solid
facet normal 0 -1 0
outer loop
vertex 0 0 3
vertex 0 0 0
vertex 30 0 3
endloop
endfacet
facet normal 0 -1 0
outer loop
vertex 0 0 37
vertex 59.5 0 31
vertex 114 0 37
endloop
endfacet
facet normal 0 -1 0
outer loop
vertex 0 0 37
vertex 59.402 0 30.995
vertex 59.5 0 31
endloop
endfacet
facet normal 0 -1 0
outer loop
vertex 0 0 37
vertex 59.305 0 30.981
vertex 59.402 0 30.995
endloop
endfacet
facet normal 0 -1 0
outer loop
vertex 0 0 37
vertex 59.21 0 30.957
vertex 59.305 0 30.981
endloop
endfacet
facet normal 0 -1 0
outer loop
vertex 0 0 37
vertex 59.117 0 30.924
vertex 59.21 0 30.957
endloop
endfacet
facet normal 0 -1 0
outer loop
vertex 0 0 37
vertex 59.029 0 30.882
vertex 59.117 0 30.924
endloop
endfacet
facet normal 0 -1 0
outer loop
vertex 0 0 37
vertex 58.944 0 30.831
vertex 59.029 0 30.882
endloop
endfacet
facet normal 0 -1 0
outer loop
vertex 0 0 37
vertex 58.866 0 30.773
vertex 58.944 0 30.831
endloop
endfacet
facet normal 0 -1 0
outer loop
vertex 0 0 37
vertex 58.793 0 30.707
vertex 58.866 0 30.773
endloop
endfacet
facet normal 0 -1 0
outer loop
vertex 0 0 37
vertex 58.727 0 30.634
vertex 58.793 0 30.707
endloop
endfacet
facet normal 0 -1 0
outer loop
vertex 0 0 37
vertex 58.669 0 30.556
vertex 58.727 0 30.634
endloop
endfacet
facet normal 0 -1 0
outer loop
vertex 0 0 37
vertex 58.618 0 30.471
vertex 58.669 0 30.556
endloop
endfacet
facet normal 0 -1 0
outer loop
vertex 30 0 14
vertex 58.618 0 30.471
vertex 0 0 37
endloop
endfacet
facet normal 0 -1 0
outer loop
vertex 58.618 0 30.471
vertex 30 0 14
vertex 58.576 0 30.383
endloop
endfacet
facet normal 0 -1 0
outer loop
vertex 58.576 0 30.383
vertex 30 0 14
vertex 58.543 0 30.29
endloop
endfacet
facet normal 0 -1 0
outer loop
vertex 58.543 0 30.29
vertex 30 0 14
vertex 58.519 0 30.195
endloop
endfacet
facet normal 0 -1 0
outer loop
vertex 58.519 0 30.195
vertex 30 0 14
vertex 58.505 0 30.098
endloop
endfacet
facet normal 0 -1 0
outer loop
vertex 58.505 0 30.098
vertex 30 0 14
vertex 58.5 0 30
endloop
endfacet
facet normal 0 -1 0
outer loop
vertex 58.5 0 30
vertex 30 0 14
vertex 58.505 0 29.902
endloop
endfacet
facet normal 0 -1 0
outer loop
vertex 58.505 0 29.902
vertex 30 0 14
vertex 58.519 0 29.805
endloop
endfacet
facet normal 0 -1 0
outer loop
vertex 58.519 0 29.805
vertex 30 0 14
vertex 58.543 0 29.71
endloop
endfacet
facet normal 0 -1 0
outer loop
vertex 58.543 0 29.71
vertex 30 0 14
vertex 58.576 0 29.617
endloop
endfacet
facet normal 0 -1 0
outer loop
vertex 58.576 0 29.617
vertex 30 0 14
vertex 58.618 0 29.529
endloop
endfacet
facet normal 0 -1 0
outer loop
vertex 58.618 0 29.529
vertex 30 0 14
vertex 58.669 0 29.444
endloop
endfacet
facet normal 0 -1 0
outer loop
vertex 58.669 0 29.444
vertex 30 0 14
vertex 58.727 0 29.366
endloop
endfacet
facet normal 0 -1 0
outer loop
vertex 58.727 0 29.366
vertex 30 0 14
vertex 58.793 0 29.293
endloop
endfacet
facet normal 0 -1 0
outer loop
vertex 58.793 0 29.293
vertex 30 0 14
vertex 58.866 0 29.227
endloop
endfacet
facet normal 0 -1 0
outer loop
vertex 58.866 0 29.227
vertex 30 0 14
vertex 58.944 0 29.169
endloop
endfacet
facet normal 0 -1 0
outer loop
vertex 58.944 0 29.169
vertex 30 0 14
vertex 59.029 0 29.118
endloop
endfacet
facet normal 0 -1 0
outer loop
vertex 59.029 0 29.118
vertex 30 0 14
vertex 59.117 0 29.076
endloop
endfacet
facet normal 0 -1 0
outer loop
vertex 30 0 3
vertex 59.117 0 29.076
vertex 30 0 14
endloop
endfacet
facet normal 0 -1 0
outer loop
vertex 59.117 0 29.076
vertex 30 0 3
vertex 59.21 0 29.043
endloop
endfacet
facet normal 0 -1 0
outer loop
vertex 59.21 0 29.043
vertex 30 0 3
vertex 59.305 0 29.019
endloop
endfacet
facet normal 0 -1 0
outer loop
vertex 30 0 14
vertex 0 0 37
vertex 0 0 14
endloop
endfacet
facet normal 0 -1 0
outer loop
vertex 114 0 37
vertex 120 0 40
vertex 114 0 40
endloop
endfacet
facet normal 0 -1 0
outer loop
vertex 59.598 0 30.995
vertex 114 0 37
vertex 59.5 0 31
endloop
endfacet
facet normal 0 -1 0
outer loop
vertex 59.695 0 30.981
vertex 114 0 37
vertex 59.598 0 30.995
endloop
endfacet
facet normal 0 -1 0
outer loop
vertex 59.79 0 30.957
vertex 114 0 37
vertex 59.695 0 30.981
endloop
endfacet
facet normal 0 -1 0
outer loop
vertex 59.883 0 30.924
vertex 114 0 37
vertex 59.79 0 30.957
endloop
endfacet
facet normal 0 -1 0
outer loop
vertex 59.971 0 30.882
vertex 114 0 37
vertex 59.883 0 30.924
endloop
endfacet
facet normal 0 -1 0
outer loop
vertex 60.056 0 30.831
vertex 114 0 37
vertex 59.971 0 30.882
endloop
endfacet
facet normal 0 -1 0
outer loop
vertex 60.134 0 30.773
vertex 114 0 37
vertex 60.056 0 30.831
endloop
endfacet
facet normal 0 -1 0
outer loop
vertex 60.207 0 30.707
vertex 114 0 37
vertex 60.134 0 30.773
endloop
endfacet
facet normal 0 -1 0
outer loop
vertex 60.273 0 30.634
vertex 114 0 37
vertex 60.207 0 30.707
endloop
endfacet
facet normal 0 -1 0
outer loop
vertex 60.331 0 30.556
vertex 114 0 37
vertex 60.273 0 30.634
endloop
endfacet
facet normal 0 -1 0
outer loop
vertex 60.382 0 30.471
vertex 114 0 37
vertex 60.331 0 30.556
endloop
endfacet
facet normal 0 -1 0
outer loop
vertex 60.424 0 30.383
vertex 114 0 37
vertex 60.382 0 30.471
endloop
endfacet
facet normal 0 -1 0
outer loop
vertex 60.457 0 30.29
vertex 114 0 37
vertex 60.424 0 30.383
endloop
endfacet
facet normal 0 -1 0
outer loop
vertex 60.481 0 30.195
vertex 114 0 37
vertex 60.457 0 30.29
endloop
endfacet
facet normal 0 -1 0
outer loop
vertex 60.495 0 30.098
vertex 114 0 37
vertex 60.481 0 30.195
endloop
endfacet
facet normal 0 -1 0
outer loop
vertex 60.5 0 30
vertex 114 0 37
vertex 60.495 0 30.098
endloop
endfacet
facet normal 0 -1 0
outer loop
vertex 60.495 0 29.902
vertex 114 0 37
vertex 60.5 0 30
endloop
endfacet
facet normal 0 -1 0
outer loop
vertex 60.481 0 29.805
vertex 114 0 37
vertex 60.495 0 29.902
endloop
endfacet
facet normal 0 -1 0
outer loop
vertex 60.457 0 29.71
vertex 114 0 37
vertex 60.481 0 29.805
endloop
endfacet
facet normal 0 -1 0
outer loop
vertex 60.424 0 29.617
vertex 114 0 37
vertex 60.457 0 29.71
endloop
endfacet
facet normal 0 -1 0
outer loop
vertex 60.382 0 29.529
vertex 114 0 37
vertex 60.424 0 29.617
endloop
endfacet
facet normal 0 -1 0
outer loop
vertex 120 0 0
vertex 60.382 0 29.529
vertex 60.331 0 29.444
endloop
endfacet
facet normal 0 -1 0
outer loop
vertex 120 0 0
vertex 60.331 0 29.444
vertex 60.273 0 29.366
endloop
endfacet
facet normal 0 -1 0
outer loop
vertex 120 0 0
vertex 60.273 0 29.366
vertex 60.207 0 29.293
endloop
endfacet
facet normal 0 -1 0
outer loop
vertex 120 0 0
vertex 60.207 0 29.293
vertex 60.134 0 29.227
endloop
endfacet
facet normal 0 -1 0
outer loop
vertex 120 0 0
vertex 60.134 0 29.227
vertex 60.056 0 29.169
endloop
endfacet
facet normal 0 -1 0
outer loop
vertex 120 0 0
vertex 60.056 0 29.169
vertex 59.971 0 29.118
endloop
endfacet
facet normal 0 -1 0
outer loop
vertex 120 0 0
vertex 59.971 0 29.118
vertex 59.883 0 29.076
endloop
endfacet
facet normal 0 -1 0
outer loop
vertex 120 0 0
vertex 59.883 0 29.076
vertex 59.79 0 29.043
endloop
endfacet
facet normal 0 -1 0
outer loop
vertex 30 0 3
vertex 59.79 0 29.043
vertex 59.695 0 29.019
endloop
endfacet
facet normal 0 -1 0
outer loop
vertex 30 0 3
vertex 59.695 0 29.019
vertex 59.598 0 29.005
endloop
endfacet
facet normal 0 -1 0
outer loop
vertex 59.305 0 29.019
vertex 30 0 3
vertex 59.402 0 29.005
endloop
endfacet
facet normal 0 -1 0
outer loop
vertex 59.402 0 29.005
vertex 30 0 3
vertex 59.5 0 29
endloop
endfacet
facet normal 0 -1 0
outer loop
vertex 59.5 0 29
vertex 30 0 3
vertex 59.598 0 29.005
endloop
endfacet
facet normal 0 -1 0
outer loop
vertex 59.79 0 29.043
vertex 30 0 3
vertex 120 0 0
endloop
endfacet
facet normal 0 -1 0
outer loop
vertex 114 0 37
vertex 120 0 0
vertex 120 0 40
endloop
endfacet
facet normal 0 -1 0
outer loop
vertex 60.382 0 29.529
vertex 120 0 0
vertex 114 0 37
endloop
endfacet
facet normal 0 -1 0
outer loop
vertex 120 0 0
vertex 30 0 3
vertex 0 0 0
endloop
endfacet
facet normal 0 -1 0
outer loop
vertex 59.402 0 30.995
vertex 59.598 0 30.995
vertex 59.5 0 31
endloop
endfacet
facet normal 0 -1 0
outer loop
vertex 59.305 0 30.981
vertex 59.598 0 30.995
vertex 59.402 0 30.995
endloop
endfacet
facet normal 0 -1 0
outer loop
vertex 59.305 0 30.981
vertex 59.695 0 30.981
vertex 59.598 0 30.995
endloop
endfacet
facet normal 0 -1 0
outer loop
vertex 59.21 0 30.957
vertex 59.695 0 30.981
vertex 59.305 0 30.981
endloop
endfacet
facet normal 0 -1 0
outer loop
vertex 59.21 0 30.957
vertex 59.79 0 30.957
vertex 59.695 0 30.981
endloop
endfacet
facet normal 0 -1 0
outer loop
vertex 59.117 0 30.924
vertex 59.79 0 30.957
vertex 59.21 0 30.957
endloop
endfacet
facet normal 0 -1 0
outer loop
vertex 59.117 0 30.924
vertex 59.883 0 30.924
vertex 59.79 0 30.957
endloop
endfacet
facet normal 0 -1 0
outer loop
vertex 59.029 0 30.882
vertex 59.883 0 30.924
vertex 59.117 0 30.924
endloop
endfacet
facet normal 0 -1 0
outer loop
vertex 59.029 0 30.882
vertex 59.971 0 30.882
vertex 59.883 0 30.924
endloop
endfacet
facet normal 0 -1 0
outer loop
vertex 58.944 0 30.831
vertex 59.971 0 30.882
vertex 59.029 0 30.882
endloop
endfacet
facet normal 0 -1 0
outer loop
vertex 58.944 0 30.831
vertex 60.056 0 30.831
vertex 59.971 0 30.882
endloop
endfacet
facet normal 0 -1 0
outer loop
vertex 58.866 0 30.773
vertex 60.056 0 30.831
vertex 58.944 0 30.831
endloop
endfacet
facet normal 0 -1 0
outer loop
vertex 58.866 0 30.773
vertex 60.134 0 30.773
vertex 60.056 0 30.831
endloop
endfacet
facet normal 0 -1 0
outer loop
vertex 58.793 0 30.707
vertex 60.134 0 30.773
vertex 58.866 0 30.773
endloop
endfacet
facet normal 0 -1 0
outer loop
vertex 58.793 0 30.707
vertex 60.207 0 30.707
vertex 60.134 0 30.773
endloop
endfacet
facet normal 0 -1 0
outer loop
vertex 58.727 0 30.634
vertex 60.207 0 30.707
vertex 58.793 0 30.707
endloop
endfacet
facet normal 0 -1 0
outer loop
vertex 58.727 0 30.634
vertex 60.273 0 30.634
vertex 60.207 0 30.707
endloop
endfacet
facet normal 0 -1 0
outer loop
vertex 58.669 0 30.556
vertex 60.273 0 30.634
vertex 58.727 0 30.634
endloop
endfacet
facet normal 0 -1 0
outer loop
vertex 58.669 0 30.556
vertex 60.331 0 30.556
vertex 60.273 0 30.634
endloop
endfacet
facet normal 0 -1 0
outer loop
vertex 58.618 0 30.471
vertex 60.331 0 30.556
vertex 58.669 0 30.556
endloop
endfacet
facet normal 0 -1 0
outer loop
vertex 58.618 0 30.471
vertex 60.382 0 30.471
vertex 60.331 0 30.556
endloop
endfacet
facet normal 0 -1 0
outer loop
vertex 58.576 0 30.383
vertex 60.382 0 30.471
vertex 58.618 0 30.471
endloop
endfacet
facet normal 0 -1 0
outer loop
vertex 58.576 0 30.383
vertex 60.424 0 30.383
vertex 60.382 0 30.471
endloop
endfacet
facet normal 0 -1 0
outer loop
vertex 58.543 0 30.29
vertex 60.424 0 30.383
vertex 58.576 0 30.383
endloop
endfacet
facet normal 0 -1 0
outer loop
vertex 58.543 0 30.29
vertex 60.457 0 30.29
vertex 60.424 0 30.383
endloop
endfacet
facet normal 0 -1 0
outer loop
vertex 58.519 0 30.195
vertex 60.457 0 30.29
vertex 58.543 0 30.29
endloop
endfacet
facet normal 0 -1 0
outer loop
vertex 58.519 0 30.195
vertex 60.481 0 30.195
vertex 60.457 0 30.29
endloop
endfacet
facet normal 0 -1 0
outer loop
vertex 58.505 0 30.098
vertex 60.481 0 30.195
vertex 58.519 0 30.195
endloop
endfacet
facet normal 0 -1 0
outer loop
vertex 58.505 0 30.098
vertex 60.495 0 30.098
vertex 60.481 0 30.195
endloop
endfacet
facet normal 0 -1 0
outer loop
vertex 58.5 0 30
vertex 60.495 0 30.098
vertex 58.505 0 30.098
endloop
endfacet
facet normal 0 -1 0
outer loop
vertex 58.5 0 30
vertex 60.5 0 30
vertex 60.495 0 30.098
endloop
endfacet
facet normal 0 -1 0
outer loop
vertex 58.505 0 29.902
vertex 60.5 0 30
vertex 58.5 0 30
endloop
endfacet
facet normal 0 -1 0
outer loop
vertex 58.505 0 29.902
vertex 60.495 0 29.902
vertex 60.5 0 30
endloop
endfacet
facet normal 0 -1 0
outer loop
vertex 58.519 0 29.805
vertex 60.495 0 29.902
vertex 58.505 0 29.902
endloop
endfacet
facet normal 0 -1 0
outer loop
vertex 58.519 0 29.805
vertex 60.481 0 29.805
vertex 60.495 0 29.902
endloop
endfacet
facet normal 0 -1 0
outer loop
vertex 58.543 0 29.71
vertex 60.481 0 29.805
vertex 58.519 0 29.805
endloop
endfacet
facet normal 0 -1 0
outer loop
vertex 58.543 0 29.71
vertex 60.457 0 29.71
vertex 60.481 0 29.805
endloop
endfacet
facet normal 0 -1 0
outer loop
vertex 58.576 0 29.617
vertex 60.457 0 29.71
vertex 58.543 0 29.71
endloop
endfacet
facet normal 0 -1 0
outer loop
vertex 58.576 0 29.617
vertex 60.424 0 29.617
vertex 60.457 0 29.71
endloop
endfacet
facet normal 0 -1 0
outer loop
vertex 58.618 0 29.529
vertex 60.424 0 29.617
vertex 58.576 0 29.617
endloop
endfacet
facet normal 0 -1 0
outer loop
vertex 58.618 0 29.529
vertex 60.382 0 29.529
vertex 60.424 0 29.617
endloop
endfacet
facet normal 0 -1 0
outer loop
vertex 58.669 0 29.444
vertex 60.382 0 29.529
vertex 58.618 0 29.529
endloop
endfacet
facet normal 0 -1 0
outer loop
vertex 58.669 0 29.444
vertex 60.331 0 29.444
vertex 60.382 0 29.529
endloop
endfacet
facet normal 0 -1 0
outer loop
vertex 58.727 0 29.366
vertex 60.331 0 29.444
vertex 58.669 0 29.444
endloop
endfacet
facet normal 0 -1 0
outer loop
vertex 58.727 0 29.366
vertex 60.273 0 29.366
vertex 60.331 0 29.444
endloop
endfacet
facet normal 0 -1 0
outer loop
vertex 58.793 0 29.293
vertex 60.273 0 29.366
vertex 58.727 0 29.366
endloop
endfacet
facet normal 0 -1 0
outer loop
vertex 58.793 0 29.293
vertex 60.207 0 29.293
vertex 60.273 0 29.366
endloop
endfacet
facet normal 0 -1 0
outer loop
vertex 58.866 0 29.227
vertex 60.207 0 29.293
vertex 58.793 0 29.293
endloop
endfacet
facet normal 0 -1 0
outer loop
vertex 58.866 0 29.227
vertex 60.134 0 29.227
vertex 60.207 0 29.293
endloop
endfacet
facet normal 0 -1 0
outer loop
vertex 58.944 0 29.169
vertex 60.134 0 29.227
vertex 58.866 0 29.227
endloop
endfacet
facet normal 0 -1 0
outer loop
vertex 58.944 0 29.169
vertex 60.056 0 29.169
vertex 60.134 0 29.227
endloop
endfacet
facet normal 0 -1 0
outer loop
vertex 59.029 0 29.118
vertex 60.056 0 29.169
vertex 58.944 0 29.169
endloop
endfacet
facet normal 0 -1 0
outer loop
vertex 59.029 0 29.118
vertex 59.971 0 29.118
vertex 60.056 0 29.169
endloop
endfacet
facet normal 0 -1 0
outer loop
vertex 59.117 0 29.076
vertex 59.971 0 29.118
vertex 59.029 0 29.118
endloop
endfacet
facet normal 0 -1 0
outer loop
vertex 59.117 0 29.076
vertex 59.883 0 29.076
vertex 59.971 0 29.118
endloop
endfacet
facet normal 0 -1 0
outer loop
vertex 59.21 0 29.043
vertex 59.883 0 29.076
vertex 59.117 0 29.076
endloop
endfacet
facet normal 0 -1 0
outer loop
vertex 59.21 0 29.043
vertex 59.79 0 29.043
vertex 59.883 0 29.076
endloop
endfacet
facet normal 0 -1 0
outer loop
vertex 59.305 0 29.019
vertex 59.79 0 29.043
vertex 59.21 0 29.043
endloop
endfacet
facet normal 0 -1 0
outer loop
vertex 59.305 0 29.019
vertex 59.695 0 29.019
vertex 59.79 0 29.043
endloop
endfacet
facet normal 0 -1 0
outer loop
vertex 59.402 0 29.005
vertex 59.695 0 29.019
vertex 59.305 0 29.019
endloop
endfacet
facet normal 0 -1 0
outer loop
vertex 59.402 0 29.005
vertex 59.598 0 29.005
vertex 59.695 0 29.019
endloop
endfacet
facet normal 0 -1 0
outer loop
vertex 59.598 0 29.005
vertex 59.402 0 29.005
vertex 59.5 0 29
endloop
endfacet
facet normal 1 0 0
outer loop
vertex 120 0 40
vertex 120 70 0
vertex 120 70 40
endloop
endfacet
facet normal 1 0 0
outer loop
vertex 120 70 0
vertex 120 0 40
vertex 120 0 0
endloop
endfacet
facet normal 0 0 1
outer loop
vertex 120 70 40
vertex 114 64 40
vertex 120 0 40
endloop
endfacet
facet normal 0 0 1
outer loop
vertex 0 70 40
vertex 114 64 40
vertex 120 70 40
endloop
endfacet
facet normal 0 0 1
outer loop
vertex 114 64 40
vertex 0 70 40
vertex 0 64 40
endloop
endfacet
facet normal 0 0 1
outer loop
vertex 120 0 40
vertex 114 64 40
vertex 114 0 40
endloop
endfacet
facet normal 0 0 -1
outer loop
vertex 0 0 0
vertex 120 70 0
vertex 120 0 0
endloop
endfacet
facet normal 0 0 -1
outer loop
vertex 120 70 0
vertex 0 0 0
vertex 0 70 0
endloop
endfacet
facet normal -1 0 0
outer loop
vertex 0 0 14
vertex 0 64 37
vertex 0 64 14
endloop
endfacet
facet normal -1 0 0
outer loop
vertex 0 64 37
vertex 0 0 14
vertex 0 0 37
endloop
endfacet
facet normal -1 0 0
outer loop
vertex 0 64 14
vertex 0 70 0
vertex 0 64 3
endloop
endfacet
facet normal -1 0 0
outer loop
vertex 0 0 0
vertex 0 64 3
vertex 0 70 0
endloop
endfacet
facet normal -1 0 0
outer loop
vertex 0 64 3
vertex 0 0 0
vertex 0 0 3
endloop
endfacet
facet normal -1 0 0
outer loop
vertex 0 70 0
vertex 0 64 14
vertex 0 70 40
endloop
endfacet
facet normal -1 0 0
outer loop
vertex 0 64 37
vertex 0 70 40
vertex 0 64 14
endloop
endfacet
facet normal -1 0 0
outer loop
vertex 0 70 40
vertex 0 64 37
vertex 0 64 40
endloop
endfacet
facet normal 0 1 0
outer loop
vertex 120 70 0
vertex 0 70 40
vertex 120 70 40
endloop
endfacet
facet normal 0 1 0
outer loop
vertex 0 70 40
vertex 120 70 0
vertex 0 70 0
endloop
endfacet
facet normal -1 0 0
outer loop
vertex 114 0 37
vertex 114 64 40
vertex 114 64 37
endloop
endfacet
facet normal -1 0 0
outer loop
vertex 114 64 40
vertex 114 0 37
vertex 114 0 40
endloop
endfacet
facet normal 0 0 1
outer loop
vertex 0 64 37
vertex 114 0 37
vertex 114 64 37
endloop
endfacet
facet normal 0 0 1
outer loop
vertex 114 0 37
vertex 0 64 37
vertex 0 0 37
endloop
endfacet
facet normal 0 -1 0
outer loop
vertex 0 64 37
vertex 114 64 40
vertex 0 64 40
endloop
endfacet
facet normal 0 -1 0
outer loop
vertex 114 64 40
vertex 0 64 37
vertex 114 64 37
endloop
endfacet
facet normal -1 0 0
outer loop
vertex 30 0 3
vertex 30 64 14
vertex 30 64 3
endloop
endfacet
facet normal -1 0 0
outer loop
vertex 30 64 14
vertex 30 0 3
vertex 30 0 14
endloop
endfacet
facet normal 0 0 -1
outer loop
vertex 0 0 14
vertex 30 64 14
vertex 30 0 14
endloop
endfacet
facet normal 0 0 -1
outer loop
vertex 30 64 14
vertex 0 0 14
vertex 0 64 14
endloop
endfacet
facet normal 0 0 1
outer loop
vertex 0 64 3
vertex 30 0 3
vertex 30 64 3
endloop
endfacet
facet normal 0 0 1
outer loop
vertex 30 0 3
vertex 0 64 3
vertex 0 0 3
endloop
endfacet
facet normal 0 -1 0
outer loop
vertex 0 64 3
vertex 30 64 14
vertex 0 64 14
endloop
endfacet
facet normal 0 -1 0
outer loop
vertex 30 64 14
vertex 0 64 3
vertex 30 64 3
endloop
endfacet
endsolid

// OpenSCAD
// Mini horizontal gel-electrophoresis box - buffer tank
// Print orientation: base on XY plane, open top at z = 40

// ---- Tank dimensions ----
outer_x = 120;   // outer length in X
outer_y = 70;    // outer width in Y
height  = 40;    // overall height in Z
wall    = 3;     // wall thickness
floor   = 3;     // floor thickness (bottom solid)

// ---- Platform dimensions ----
plat_len   = 60;  // platform length in X (centred)
plat_wid   = outer_y - 2*wall; // platform spans full inner width
plat_top_z = 13;  // top of platform (inner floor at z=3 + 10 mm)

// ---- Wire holes ----
hole_d     = 2;   // electrode wire hole diameter
hole_y     = 0;   // hole Y position
hole_z     = 30;  // hole Z position
eps        = 0.5; // cutter overshoot past end walls

$fn = 64;

difference() {
    // Main tank body
    cube([outer_x, outer_y, height]);

    // Open top (cavity)
    translate([0, 0, height - floor])
        cube([outer_x - 2*wall, outer_y - 2*wall, height - floor]);

    // Raised platform
    translate([-plat_len/2, 0, floor])
        cube([plat_len, plat_wid, plat_top_z - floor + 1]); // +1 fuses into floor

    // Wire holes through end walls along X
    for (sx = [-1, 1])
        translate([sx * (outer_x/2 - eps), hole_y, hole_z])
            rotate([90, 0, 0])
                cylinder(d = hole_d, h = outer_x + 2*eps, $fn = 64);
}
